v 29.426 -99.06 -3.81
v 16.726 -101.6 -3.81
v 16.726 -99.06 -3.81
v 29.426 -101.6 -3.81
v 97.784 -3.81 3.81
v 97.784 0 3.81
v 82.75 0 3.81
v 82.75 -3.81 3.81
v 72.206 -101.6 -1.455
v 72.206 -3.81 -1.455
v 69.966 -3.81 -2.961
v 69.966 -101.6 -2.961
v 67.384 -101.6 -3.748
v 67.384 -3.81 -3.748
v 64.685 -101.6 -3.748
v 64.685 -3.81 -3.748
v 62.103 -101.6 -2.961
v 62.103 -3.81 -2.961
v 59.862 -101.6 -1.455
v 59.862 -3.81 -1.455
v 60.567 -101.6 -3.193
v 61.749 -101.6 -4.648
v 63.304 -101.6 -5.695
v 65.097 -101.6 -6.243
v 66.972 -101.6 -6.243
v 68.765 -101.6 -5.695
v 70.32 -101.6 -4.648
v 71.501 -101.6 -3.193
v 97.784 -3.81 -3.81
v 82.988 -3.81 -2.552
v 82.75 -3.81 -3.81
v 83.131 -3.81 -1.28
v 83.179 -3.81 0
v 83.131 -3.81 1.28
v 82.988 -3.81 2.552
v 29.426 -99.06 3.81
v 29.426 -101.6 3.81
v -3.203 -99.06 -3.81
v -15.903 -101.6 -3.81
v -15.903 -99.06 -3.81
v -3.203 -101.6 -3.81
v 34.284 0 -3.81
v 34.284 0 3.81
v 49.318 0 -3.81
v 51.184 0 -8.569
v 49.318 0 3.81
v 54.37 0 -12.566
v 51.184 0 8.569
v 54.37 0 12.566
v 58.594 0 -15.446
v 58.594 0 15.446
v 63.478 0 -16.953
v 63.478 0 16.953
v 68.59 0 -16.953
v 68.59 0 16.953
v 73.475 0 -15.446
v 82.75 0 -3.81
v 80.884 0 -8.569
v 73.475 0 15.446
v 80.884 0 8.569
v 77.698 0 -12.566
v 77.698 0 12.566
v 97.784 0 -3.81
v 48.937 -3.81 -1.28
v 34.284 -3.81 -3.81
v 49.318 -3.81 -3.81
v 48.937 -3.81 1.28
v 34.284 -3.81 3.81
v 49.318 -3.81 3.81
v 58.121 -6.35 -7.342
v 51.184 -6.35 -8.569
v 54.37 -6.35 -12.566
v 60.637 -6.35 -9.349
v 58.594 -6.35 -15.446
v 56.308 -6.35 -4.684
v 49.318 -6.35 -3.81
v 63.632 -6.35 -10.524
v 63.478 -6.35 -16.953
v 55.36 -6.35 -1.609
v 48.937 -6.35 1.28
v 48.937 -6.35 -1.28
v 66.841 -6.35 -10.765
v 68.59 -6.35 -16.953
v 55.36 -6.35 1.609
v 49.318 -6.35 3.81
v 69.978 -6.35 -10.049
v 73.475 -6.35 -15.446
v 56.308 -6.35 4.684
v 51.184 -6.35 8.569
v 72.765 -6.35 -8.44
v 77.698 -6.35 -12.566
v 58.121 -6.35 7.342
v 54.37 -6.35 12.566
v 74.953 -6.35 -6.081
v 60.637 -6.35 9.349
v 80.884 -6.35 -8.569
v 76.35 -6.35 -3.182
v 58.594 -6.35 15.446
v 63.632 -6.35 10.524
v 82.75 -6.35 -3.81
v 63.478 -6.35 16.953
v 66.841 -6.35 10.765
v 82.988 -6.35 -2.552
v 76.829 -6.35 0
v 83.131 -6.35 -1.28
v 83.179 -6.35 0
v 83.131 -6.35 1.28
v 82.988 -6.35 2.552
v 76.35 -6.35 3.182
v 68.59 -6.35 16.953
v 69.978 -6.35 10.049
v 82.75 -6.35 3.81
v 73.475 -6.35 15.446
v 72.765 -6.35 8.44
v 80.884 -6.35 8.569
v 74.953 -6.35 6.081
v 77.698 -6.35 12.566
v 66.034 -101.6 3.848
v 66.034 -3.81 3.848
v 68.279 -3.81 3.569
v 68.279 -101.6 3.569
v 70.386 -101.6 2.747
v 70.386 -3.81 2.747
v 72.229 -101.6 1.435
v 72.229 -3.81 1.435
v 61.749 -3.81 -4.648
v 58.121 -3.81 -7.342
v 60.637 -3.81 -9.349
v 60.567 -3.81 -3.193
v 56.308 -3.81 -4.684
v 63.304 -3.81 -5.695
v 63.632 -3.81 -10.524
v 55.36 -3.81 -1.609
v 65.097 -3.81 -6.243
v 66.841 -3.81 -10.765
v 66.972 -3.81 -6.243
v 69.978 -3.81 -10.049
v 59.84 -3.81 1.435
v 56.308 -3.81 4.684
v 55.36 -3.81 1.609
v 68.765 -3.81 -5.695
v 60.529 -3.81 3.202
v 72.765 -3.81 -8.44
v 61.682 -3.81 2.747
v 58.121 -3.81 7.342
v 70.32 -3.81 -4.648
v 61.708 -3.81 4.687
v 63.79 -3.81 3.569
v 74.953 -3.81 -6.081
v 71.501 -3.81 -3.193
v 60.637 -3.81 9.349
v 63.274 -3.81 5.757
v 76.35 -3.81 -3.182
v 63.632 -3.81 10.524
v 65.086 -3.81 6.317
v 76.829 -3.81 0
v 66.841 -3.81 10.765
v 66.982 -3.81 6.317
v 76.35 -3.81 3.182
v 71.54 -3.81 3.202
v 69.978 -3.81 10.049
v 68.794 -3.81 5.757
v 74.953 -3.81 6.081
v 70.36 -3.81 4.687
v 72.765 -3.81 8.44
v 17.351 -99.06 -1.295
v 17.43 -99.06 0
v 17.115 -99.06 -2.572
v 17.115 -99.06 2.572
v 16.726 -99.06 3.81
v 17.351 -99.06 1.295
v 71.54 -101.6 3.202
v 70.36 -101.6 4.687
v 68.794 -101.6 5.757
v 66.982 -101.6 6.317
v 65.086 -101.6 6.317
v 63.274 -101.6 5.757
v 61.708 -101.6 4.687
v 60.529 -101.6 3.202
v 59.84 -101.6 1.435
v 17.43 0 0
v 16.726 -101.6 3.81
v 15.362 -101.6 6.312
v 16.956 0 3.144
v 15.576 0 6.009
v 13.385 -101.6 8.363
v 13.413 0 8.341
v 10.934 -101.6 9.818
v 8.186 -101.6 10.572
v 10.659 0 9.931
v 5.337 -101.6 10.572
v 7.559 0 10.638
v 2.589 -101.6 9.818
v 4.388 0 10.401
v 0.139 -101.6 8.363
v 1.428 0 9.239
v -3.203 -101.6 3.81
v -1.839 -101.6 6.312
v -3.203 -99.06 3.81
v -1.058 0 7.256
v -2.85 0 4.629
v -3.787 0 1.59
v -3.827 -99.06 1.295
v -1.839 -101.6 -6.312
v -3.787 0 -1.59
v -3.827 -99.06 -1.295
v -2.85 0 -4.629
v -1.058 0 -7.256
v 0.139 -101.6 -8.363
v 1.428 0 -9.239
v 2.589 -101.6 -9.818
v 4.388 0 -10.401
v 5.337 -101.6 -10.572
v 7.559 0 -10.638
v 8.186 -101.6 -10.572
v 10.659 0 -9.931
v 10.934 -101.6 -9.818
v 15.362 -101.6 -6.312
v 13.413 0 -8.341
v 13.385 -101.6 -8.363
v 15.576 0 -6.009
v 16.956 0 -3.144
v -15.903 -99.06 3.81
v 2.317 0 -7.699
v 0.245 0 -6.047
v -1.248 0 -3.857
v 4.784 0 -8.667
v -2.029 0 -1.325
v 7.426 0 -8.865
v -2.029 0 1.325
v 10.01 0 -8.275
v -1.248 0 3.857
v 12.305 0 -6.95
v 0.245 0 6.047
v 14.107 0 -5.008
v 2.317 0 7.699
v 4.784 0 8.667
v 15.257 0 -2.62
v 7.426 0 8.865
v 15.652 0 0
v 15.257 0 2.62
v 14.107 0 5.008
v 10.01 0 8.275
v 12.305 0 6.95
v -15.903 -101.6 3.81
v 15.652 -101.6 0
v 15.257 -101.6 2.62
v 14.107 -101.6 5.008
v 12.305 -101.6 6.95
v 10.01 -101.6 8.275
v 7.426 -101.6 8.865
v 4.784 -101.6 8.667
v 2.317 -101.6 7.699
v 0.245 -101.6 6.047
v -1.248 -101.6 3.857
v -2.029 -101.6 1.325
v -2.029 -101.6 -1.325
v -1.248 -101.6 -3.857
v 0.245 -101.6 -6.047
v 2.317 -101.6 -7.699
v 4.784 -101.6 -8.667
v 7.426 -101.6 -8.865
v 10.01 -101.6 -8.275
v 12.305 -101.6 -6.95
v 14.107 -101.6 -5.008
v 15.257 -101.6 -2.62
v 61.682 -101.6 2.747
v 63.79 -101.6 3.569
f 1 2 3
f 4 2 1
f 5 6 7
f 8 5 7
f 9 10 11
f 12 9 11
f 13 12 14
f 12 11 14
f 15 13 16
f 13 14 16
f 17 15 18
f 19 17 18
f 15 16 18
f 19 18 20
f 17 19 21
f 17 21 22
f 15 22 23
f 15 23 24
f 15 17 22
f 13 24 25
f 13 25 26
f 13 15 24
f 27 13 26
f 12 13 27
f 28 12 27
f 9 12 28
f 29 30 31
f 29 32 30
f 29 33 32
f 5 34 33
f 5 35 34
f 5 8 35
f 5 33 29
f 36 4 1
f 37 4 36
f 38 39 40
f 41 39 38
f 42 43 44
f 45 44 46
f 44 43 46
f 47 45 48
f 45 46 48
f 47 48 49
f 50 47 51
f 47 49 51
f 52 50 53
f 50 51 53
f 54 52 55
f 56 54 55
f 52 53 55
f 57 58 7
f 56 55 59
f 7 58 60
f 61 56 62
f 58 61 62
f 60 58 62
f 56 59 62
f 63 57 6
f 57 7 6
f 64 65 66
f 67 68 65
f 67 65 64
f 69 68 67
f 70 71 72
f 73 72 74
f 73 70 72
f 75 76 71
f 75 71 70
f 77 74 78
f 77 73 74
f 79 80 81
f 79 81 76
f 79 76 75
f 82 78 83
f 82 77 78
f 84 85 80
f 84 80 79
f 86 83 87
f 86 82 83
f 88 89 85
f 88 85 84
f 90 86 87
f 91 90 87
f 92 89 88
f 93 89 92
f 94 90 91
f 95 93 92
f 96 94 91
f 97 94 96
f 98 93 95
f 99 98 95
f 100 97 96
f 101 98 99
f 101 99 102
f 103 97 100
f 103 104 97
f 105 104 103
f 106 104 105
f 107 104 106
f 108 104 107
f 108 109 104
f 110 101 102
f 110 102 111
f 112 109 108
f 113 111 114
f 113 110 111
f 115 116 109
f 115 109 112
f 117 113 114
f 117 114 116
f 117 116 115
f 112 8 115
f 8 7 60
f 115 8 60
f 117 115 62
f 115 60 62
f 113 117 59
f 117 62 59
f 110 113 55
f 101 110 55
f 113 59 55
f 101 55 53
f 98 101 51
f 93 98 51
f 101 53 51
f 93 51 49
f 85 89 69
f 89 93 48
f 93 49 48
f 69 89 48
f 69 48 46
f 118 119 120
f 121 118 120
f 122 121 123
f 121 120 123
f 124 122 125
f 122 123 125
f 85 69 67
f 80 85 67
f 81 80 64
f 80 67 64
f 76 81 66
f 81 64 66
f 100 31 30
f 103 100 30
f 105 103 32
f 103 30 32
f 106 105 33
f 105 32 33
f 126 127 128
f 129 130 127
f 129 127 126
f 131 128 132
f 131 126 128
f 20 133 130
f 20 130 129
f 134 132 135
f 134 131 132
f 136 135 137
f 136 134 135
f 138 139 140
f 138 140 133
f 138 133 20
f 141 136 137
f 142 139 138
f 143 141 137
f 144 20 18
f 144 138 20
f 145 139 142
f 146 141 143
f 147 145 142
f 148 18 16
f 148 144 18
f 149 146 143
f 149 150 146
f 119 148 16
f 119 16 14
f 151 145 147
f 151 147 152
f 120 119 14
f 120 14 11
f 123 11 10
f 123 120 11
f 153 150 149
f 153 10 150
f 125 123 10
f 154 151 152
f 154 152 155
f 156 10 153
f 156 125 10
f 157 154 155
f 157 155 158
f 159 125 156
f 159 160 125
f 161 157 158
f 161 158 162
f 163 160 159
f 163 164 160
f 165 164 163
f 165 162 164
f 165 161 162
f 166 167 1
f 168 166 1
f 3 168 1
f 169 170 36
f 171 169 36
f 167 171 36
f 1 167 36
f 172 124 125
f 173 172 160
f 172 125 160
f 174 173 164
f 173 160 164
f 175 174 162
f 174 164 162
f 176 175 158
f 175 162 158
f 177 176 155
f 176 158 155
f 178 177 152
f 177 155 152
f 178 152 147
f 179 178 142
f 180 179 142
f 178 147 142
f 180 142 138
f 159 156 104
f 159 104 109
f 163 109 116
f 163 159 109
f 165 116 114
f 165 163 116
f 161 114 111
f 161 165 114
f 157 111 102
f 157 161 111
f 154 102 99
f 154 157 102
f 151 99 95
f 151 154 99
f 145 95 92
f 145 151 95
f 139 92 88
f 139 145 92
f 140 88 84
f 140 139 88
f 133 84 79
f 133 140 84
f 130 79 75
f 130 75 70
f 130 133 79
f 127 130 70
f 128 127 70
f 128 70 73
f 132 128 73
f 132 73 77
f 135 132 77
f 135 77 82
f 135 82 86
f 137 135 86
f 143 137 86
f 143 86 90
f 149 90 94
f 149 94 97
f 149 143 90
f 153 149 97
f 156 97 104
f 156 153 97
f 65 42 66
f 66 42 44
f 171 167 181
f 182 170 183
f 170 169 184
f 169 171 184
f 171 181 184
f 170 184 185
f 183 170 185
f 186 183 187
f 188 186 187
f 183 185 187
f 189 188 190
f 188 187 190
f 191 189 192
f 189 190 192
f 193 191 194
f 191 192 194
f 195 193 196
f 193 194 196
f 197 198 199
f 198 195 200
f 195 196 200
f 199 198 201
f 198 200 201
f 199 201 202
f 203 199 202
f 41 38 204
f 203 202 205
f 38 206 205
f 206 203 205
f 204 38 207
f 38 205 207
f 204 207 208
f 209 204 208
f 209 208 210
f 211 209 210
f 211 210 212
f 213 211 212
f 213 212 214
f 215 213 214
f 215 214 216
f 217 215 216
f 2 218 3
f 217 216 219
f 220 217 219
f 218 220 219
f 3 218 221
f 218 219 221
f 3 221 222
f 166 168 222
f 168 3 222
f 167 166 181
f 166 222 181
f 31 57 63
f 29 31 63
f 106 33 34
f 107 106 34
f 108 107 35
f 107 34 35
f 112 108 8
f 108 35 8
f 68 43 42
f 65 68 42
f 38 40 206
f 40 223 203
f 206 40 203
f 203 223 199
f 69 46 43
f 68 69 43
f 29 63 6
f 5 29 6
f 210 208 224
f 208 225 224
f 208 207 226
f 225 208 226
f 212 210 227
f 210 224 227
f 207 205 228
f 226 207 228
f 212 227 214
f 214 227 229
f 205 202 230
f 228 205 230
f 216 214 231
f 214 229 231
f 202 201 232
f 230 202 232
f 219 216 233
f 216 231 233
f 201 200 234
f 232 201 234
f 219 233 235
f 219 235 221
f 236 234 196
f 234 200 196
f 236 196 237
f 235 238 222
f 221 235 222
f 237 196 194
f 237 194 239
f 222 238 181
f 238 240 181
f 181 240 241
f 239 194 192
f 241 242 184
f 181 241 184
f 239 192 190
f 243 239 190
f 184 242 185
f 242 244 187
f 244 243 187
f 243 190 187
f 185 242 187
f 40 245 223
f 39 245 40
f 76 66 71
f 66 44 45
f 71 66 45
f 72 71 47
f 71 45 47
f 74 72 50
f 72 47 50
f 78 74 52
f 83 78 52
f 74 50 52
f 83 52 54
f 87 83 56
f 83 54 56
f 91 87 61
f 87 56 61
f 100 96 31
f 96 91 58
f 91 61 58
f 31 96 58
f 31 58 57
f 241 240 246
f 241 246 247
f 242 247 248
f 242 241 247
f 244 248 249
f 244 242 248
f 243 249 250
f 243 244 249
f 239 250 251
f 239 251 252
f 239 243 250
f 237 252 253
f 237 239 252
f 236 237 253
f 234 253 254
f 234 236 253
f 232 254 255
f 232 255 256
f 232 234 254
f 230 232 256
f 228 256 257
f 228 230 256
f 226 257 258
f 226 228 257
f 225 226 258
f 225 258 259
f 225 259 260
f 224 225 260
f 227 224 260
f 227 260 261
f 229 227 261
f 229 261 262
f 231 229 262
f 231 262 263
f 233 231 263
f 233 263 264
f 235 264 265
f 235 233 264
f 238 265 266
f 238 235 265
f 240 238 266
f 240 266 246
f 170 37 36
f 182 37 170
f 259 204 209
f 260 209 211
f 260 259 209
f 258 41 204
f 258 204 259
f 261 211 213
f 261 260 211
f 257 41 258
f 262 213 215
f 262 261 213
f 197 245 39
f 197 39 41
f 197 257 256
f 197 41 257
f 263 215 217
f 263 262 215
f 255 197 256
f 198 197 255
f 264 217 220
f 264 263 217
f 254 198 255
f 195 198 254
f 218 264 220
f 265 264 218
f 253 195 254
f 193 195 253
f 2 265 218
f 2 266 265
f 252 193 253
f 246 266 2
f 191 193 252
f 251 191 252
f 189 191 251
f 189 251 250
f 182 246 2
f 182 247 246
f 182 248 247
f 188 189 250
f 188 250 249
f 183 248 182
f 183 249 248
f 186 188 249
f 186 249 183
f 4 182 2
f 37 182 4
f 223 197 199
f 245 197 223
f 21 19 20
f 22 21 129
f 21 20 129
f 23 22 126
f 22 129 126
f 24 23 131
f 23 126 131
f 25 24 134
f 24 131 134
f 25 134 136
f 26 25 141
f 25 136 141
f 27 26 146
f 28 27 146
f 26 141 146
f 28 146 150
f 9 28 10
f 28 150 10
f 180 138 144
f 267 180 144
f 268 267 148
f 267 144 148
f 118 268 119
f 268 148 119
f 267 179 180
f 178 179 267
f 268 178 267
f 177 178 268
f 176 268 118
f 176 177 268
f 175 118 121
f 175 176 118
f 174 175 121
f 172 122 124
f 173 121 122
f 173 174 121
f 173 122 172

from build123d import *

# Parameters (mm, degrees)
F0_R     = 15.875
F1_DEPTH = 3.81
F2_R     = 10.795
F3_DEPTH = 2.54
F4_R     = 10.668
F4_R_2   = 8.89
F5_DEPTH = 101.6
F7_DEPTH = 101.6
F9_DEPTH = 2.54


# Not quite as in the source:
# - a feature names something its author has since deleted; it is built from what else it names


with BuildPart() as f1:
    # F0 (on Front) → F1 (new body)
    with BuildSketch(Plane.XZ):
        with BuildLine():
            Line((34.2841744423, 3.81), (34.2841744423, 0))
            Line((34.2841744423, 0), (34.2841744423, -3.81))
            Line((34.2841744423, -3.81), (49.3178672843, -3.81))
            ThreePointArc((49.3178672843, -3.81), (48.8891744423, 0), (49.3178672843, 3.81))
            Line((49.3178672843, 3.81), (34.2841744423, 3.81))
        make_face()
        with BuildLine():
            Line((97.7841744423, 3.81), (82.7504816003, 3.81))
            ThreePointArc((82.7504816003, 3.81), (83.0716641521, 1.9170209671), (83.1791744423, 0))
            ThreePointArc((83.1791744423, 0), (83.0716641521, -1.9170209671), (82.7504816003, -3.81))
            Line((82.7504816003, -3.81), (97.7841744423, -3.81))
            Line((97.7841744423, -3.81), (97.7841744423, 0))
            Line((97.7841744423, 0), (97.7841744423, 3.81))
        make_face()
        with BuildLine():
            ThreePointArc((82.7504816003, 3.81), (66.0341744423, 17.145), (49.3178672843, 3.81))
            ThreePointArc((49.3178672843, 3.81), (48.8891744423, 0), (49.3178672843, -3.81))
            ThreePointArc((49.3178672843, -3.81), (66.0341744423, -17.145), (82.7504816003, -3.81))
            ThreePointArc((82.7504816003, -3.81), (83.0716641521, -1.9170209671), (83.1791744423, 0))
            ThreePointArc((83.1791744423, 0), (83.0716641521, 1.9170209671), (82.7504816003, 3.81))
        make_face()
        with Locations((66.0341744423, 0)):
            Circle(F0_R, mode=Mode.SUBTRACT)
        with Locations((66.0341744423, 0)):
            Circle(F0_R)
    extrude(amount=F1_DEPTH)

    # F2 (on face) → F3 (join)
    with BuildSketch(Plane.XZ.offset(3.81)):
        with BuildLine():
            ThreePointArc((82.7504816003, 3.81), (66.0341744423, 17.145), (49.3178672843, 3.81))
            ThreePointArc((49.3178672843, 3.81), (48.8891744423, 0), (49.3178672843, -3.81))
            ThreePointArc((49.3178672843, -3.81), (66.0341744423, -17.145), (82.7504816003, -3.81))
            ThreePointArc((82.7504816003, -3.81), (83.0716641521, -1.9170209671), (83.1791744423, 0))
            ThreePointArc((83.1791744423, 0), (83.0716641521, 1.9170209671), (82.7504816003, 3.81))
        make_face()
        with Locations((66.0341744423, 0)):
            Circle(F2_R, mode=Mode.SUBTRACT)
    extrude(amount=F3_DEPTH)

    # F6 (on Front) → F7 (join)
    with BuildSketch(Plane.XZ):
        with BuildLine():
            ThreePointArc((66.0341744423, 3.8478664845), (69.3580825337, 3.2233188982), (72.2285986286, 1.4348664845))
            ThreePointArc((72.2285986286, 1.4348664845), (66.0341744423, 6.3878664845), (59.839750256, 1.4348664845))
            ThreePointArc((59.839750256, 1.4348664845), (62.7102663509, 3.2233188982), (66.0341744423, 3.8478664845))
        make_face()
        with BuildLine():
            ThreePointArc((59.8622690304, -1.4554799544), (66.0341744423, -6.3121335155), (72.2060798542, -1.4554799544))
            ThreePointArc((72.2060798542, -1.4554799544), (66.0341744423, -3.8478664845), (59.8622690304, -1.4554799544))
        make_face()
    extrude(amount=F7_DEPTH)


with BuildPart() as f5:
    # F4 (on Front) → F5 (new body)
    with BuildSketch(Plane.XZ):
        with Locations((6.7617367022, 0)):
            Circle(F4_R)
        with Locations((6.7617367022, 0)):
            Circle(F4_R_2, mode=Mode.SUBTRACT)
    extrude(amount=F5_DEPTH)

    # F8 (on face) → F9 (join)
    with BuildSketch(Plane.XZ.offset(101.6)):
        with BuildLine():
            ThreePointArc((-3.2027062828, -3.81), (-3.9062632978, 0), (-3.2027062828, 3.81))
            Line((-3.2027062828, 3.81), (-15.9027062828, 3.81))
            Line((-15.9027062828, 3.81), (-15.9027062828, -3.81))
            Line((-15.9027062828, -3.81), (-3.2027062828, -3.81))
        make_face()
        with BuildLine():
            Line((29.4261796871, 3.81), (16.7261796871, 3.81))
            ThreePointArc((16.7261796871, 3.81), (17.2523730452, 1.9372075569), (17.4297367022, 0))
            ThreePointArc((17.4297367022, 0), (17.2523730452, -1.9372075569), (16.7261796871, -3.81))
            Line((16.7261796871, -3.81), (29.4261796871, -3.81))
            Line((29.4261796871, -3.81), (29.4261796871, 3.81))
        make_face()
    extrude(amount=-F9_DEPTH)


solid = Compound([f1.part, f5.part])
